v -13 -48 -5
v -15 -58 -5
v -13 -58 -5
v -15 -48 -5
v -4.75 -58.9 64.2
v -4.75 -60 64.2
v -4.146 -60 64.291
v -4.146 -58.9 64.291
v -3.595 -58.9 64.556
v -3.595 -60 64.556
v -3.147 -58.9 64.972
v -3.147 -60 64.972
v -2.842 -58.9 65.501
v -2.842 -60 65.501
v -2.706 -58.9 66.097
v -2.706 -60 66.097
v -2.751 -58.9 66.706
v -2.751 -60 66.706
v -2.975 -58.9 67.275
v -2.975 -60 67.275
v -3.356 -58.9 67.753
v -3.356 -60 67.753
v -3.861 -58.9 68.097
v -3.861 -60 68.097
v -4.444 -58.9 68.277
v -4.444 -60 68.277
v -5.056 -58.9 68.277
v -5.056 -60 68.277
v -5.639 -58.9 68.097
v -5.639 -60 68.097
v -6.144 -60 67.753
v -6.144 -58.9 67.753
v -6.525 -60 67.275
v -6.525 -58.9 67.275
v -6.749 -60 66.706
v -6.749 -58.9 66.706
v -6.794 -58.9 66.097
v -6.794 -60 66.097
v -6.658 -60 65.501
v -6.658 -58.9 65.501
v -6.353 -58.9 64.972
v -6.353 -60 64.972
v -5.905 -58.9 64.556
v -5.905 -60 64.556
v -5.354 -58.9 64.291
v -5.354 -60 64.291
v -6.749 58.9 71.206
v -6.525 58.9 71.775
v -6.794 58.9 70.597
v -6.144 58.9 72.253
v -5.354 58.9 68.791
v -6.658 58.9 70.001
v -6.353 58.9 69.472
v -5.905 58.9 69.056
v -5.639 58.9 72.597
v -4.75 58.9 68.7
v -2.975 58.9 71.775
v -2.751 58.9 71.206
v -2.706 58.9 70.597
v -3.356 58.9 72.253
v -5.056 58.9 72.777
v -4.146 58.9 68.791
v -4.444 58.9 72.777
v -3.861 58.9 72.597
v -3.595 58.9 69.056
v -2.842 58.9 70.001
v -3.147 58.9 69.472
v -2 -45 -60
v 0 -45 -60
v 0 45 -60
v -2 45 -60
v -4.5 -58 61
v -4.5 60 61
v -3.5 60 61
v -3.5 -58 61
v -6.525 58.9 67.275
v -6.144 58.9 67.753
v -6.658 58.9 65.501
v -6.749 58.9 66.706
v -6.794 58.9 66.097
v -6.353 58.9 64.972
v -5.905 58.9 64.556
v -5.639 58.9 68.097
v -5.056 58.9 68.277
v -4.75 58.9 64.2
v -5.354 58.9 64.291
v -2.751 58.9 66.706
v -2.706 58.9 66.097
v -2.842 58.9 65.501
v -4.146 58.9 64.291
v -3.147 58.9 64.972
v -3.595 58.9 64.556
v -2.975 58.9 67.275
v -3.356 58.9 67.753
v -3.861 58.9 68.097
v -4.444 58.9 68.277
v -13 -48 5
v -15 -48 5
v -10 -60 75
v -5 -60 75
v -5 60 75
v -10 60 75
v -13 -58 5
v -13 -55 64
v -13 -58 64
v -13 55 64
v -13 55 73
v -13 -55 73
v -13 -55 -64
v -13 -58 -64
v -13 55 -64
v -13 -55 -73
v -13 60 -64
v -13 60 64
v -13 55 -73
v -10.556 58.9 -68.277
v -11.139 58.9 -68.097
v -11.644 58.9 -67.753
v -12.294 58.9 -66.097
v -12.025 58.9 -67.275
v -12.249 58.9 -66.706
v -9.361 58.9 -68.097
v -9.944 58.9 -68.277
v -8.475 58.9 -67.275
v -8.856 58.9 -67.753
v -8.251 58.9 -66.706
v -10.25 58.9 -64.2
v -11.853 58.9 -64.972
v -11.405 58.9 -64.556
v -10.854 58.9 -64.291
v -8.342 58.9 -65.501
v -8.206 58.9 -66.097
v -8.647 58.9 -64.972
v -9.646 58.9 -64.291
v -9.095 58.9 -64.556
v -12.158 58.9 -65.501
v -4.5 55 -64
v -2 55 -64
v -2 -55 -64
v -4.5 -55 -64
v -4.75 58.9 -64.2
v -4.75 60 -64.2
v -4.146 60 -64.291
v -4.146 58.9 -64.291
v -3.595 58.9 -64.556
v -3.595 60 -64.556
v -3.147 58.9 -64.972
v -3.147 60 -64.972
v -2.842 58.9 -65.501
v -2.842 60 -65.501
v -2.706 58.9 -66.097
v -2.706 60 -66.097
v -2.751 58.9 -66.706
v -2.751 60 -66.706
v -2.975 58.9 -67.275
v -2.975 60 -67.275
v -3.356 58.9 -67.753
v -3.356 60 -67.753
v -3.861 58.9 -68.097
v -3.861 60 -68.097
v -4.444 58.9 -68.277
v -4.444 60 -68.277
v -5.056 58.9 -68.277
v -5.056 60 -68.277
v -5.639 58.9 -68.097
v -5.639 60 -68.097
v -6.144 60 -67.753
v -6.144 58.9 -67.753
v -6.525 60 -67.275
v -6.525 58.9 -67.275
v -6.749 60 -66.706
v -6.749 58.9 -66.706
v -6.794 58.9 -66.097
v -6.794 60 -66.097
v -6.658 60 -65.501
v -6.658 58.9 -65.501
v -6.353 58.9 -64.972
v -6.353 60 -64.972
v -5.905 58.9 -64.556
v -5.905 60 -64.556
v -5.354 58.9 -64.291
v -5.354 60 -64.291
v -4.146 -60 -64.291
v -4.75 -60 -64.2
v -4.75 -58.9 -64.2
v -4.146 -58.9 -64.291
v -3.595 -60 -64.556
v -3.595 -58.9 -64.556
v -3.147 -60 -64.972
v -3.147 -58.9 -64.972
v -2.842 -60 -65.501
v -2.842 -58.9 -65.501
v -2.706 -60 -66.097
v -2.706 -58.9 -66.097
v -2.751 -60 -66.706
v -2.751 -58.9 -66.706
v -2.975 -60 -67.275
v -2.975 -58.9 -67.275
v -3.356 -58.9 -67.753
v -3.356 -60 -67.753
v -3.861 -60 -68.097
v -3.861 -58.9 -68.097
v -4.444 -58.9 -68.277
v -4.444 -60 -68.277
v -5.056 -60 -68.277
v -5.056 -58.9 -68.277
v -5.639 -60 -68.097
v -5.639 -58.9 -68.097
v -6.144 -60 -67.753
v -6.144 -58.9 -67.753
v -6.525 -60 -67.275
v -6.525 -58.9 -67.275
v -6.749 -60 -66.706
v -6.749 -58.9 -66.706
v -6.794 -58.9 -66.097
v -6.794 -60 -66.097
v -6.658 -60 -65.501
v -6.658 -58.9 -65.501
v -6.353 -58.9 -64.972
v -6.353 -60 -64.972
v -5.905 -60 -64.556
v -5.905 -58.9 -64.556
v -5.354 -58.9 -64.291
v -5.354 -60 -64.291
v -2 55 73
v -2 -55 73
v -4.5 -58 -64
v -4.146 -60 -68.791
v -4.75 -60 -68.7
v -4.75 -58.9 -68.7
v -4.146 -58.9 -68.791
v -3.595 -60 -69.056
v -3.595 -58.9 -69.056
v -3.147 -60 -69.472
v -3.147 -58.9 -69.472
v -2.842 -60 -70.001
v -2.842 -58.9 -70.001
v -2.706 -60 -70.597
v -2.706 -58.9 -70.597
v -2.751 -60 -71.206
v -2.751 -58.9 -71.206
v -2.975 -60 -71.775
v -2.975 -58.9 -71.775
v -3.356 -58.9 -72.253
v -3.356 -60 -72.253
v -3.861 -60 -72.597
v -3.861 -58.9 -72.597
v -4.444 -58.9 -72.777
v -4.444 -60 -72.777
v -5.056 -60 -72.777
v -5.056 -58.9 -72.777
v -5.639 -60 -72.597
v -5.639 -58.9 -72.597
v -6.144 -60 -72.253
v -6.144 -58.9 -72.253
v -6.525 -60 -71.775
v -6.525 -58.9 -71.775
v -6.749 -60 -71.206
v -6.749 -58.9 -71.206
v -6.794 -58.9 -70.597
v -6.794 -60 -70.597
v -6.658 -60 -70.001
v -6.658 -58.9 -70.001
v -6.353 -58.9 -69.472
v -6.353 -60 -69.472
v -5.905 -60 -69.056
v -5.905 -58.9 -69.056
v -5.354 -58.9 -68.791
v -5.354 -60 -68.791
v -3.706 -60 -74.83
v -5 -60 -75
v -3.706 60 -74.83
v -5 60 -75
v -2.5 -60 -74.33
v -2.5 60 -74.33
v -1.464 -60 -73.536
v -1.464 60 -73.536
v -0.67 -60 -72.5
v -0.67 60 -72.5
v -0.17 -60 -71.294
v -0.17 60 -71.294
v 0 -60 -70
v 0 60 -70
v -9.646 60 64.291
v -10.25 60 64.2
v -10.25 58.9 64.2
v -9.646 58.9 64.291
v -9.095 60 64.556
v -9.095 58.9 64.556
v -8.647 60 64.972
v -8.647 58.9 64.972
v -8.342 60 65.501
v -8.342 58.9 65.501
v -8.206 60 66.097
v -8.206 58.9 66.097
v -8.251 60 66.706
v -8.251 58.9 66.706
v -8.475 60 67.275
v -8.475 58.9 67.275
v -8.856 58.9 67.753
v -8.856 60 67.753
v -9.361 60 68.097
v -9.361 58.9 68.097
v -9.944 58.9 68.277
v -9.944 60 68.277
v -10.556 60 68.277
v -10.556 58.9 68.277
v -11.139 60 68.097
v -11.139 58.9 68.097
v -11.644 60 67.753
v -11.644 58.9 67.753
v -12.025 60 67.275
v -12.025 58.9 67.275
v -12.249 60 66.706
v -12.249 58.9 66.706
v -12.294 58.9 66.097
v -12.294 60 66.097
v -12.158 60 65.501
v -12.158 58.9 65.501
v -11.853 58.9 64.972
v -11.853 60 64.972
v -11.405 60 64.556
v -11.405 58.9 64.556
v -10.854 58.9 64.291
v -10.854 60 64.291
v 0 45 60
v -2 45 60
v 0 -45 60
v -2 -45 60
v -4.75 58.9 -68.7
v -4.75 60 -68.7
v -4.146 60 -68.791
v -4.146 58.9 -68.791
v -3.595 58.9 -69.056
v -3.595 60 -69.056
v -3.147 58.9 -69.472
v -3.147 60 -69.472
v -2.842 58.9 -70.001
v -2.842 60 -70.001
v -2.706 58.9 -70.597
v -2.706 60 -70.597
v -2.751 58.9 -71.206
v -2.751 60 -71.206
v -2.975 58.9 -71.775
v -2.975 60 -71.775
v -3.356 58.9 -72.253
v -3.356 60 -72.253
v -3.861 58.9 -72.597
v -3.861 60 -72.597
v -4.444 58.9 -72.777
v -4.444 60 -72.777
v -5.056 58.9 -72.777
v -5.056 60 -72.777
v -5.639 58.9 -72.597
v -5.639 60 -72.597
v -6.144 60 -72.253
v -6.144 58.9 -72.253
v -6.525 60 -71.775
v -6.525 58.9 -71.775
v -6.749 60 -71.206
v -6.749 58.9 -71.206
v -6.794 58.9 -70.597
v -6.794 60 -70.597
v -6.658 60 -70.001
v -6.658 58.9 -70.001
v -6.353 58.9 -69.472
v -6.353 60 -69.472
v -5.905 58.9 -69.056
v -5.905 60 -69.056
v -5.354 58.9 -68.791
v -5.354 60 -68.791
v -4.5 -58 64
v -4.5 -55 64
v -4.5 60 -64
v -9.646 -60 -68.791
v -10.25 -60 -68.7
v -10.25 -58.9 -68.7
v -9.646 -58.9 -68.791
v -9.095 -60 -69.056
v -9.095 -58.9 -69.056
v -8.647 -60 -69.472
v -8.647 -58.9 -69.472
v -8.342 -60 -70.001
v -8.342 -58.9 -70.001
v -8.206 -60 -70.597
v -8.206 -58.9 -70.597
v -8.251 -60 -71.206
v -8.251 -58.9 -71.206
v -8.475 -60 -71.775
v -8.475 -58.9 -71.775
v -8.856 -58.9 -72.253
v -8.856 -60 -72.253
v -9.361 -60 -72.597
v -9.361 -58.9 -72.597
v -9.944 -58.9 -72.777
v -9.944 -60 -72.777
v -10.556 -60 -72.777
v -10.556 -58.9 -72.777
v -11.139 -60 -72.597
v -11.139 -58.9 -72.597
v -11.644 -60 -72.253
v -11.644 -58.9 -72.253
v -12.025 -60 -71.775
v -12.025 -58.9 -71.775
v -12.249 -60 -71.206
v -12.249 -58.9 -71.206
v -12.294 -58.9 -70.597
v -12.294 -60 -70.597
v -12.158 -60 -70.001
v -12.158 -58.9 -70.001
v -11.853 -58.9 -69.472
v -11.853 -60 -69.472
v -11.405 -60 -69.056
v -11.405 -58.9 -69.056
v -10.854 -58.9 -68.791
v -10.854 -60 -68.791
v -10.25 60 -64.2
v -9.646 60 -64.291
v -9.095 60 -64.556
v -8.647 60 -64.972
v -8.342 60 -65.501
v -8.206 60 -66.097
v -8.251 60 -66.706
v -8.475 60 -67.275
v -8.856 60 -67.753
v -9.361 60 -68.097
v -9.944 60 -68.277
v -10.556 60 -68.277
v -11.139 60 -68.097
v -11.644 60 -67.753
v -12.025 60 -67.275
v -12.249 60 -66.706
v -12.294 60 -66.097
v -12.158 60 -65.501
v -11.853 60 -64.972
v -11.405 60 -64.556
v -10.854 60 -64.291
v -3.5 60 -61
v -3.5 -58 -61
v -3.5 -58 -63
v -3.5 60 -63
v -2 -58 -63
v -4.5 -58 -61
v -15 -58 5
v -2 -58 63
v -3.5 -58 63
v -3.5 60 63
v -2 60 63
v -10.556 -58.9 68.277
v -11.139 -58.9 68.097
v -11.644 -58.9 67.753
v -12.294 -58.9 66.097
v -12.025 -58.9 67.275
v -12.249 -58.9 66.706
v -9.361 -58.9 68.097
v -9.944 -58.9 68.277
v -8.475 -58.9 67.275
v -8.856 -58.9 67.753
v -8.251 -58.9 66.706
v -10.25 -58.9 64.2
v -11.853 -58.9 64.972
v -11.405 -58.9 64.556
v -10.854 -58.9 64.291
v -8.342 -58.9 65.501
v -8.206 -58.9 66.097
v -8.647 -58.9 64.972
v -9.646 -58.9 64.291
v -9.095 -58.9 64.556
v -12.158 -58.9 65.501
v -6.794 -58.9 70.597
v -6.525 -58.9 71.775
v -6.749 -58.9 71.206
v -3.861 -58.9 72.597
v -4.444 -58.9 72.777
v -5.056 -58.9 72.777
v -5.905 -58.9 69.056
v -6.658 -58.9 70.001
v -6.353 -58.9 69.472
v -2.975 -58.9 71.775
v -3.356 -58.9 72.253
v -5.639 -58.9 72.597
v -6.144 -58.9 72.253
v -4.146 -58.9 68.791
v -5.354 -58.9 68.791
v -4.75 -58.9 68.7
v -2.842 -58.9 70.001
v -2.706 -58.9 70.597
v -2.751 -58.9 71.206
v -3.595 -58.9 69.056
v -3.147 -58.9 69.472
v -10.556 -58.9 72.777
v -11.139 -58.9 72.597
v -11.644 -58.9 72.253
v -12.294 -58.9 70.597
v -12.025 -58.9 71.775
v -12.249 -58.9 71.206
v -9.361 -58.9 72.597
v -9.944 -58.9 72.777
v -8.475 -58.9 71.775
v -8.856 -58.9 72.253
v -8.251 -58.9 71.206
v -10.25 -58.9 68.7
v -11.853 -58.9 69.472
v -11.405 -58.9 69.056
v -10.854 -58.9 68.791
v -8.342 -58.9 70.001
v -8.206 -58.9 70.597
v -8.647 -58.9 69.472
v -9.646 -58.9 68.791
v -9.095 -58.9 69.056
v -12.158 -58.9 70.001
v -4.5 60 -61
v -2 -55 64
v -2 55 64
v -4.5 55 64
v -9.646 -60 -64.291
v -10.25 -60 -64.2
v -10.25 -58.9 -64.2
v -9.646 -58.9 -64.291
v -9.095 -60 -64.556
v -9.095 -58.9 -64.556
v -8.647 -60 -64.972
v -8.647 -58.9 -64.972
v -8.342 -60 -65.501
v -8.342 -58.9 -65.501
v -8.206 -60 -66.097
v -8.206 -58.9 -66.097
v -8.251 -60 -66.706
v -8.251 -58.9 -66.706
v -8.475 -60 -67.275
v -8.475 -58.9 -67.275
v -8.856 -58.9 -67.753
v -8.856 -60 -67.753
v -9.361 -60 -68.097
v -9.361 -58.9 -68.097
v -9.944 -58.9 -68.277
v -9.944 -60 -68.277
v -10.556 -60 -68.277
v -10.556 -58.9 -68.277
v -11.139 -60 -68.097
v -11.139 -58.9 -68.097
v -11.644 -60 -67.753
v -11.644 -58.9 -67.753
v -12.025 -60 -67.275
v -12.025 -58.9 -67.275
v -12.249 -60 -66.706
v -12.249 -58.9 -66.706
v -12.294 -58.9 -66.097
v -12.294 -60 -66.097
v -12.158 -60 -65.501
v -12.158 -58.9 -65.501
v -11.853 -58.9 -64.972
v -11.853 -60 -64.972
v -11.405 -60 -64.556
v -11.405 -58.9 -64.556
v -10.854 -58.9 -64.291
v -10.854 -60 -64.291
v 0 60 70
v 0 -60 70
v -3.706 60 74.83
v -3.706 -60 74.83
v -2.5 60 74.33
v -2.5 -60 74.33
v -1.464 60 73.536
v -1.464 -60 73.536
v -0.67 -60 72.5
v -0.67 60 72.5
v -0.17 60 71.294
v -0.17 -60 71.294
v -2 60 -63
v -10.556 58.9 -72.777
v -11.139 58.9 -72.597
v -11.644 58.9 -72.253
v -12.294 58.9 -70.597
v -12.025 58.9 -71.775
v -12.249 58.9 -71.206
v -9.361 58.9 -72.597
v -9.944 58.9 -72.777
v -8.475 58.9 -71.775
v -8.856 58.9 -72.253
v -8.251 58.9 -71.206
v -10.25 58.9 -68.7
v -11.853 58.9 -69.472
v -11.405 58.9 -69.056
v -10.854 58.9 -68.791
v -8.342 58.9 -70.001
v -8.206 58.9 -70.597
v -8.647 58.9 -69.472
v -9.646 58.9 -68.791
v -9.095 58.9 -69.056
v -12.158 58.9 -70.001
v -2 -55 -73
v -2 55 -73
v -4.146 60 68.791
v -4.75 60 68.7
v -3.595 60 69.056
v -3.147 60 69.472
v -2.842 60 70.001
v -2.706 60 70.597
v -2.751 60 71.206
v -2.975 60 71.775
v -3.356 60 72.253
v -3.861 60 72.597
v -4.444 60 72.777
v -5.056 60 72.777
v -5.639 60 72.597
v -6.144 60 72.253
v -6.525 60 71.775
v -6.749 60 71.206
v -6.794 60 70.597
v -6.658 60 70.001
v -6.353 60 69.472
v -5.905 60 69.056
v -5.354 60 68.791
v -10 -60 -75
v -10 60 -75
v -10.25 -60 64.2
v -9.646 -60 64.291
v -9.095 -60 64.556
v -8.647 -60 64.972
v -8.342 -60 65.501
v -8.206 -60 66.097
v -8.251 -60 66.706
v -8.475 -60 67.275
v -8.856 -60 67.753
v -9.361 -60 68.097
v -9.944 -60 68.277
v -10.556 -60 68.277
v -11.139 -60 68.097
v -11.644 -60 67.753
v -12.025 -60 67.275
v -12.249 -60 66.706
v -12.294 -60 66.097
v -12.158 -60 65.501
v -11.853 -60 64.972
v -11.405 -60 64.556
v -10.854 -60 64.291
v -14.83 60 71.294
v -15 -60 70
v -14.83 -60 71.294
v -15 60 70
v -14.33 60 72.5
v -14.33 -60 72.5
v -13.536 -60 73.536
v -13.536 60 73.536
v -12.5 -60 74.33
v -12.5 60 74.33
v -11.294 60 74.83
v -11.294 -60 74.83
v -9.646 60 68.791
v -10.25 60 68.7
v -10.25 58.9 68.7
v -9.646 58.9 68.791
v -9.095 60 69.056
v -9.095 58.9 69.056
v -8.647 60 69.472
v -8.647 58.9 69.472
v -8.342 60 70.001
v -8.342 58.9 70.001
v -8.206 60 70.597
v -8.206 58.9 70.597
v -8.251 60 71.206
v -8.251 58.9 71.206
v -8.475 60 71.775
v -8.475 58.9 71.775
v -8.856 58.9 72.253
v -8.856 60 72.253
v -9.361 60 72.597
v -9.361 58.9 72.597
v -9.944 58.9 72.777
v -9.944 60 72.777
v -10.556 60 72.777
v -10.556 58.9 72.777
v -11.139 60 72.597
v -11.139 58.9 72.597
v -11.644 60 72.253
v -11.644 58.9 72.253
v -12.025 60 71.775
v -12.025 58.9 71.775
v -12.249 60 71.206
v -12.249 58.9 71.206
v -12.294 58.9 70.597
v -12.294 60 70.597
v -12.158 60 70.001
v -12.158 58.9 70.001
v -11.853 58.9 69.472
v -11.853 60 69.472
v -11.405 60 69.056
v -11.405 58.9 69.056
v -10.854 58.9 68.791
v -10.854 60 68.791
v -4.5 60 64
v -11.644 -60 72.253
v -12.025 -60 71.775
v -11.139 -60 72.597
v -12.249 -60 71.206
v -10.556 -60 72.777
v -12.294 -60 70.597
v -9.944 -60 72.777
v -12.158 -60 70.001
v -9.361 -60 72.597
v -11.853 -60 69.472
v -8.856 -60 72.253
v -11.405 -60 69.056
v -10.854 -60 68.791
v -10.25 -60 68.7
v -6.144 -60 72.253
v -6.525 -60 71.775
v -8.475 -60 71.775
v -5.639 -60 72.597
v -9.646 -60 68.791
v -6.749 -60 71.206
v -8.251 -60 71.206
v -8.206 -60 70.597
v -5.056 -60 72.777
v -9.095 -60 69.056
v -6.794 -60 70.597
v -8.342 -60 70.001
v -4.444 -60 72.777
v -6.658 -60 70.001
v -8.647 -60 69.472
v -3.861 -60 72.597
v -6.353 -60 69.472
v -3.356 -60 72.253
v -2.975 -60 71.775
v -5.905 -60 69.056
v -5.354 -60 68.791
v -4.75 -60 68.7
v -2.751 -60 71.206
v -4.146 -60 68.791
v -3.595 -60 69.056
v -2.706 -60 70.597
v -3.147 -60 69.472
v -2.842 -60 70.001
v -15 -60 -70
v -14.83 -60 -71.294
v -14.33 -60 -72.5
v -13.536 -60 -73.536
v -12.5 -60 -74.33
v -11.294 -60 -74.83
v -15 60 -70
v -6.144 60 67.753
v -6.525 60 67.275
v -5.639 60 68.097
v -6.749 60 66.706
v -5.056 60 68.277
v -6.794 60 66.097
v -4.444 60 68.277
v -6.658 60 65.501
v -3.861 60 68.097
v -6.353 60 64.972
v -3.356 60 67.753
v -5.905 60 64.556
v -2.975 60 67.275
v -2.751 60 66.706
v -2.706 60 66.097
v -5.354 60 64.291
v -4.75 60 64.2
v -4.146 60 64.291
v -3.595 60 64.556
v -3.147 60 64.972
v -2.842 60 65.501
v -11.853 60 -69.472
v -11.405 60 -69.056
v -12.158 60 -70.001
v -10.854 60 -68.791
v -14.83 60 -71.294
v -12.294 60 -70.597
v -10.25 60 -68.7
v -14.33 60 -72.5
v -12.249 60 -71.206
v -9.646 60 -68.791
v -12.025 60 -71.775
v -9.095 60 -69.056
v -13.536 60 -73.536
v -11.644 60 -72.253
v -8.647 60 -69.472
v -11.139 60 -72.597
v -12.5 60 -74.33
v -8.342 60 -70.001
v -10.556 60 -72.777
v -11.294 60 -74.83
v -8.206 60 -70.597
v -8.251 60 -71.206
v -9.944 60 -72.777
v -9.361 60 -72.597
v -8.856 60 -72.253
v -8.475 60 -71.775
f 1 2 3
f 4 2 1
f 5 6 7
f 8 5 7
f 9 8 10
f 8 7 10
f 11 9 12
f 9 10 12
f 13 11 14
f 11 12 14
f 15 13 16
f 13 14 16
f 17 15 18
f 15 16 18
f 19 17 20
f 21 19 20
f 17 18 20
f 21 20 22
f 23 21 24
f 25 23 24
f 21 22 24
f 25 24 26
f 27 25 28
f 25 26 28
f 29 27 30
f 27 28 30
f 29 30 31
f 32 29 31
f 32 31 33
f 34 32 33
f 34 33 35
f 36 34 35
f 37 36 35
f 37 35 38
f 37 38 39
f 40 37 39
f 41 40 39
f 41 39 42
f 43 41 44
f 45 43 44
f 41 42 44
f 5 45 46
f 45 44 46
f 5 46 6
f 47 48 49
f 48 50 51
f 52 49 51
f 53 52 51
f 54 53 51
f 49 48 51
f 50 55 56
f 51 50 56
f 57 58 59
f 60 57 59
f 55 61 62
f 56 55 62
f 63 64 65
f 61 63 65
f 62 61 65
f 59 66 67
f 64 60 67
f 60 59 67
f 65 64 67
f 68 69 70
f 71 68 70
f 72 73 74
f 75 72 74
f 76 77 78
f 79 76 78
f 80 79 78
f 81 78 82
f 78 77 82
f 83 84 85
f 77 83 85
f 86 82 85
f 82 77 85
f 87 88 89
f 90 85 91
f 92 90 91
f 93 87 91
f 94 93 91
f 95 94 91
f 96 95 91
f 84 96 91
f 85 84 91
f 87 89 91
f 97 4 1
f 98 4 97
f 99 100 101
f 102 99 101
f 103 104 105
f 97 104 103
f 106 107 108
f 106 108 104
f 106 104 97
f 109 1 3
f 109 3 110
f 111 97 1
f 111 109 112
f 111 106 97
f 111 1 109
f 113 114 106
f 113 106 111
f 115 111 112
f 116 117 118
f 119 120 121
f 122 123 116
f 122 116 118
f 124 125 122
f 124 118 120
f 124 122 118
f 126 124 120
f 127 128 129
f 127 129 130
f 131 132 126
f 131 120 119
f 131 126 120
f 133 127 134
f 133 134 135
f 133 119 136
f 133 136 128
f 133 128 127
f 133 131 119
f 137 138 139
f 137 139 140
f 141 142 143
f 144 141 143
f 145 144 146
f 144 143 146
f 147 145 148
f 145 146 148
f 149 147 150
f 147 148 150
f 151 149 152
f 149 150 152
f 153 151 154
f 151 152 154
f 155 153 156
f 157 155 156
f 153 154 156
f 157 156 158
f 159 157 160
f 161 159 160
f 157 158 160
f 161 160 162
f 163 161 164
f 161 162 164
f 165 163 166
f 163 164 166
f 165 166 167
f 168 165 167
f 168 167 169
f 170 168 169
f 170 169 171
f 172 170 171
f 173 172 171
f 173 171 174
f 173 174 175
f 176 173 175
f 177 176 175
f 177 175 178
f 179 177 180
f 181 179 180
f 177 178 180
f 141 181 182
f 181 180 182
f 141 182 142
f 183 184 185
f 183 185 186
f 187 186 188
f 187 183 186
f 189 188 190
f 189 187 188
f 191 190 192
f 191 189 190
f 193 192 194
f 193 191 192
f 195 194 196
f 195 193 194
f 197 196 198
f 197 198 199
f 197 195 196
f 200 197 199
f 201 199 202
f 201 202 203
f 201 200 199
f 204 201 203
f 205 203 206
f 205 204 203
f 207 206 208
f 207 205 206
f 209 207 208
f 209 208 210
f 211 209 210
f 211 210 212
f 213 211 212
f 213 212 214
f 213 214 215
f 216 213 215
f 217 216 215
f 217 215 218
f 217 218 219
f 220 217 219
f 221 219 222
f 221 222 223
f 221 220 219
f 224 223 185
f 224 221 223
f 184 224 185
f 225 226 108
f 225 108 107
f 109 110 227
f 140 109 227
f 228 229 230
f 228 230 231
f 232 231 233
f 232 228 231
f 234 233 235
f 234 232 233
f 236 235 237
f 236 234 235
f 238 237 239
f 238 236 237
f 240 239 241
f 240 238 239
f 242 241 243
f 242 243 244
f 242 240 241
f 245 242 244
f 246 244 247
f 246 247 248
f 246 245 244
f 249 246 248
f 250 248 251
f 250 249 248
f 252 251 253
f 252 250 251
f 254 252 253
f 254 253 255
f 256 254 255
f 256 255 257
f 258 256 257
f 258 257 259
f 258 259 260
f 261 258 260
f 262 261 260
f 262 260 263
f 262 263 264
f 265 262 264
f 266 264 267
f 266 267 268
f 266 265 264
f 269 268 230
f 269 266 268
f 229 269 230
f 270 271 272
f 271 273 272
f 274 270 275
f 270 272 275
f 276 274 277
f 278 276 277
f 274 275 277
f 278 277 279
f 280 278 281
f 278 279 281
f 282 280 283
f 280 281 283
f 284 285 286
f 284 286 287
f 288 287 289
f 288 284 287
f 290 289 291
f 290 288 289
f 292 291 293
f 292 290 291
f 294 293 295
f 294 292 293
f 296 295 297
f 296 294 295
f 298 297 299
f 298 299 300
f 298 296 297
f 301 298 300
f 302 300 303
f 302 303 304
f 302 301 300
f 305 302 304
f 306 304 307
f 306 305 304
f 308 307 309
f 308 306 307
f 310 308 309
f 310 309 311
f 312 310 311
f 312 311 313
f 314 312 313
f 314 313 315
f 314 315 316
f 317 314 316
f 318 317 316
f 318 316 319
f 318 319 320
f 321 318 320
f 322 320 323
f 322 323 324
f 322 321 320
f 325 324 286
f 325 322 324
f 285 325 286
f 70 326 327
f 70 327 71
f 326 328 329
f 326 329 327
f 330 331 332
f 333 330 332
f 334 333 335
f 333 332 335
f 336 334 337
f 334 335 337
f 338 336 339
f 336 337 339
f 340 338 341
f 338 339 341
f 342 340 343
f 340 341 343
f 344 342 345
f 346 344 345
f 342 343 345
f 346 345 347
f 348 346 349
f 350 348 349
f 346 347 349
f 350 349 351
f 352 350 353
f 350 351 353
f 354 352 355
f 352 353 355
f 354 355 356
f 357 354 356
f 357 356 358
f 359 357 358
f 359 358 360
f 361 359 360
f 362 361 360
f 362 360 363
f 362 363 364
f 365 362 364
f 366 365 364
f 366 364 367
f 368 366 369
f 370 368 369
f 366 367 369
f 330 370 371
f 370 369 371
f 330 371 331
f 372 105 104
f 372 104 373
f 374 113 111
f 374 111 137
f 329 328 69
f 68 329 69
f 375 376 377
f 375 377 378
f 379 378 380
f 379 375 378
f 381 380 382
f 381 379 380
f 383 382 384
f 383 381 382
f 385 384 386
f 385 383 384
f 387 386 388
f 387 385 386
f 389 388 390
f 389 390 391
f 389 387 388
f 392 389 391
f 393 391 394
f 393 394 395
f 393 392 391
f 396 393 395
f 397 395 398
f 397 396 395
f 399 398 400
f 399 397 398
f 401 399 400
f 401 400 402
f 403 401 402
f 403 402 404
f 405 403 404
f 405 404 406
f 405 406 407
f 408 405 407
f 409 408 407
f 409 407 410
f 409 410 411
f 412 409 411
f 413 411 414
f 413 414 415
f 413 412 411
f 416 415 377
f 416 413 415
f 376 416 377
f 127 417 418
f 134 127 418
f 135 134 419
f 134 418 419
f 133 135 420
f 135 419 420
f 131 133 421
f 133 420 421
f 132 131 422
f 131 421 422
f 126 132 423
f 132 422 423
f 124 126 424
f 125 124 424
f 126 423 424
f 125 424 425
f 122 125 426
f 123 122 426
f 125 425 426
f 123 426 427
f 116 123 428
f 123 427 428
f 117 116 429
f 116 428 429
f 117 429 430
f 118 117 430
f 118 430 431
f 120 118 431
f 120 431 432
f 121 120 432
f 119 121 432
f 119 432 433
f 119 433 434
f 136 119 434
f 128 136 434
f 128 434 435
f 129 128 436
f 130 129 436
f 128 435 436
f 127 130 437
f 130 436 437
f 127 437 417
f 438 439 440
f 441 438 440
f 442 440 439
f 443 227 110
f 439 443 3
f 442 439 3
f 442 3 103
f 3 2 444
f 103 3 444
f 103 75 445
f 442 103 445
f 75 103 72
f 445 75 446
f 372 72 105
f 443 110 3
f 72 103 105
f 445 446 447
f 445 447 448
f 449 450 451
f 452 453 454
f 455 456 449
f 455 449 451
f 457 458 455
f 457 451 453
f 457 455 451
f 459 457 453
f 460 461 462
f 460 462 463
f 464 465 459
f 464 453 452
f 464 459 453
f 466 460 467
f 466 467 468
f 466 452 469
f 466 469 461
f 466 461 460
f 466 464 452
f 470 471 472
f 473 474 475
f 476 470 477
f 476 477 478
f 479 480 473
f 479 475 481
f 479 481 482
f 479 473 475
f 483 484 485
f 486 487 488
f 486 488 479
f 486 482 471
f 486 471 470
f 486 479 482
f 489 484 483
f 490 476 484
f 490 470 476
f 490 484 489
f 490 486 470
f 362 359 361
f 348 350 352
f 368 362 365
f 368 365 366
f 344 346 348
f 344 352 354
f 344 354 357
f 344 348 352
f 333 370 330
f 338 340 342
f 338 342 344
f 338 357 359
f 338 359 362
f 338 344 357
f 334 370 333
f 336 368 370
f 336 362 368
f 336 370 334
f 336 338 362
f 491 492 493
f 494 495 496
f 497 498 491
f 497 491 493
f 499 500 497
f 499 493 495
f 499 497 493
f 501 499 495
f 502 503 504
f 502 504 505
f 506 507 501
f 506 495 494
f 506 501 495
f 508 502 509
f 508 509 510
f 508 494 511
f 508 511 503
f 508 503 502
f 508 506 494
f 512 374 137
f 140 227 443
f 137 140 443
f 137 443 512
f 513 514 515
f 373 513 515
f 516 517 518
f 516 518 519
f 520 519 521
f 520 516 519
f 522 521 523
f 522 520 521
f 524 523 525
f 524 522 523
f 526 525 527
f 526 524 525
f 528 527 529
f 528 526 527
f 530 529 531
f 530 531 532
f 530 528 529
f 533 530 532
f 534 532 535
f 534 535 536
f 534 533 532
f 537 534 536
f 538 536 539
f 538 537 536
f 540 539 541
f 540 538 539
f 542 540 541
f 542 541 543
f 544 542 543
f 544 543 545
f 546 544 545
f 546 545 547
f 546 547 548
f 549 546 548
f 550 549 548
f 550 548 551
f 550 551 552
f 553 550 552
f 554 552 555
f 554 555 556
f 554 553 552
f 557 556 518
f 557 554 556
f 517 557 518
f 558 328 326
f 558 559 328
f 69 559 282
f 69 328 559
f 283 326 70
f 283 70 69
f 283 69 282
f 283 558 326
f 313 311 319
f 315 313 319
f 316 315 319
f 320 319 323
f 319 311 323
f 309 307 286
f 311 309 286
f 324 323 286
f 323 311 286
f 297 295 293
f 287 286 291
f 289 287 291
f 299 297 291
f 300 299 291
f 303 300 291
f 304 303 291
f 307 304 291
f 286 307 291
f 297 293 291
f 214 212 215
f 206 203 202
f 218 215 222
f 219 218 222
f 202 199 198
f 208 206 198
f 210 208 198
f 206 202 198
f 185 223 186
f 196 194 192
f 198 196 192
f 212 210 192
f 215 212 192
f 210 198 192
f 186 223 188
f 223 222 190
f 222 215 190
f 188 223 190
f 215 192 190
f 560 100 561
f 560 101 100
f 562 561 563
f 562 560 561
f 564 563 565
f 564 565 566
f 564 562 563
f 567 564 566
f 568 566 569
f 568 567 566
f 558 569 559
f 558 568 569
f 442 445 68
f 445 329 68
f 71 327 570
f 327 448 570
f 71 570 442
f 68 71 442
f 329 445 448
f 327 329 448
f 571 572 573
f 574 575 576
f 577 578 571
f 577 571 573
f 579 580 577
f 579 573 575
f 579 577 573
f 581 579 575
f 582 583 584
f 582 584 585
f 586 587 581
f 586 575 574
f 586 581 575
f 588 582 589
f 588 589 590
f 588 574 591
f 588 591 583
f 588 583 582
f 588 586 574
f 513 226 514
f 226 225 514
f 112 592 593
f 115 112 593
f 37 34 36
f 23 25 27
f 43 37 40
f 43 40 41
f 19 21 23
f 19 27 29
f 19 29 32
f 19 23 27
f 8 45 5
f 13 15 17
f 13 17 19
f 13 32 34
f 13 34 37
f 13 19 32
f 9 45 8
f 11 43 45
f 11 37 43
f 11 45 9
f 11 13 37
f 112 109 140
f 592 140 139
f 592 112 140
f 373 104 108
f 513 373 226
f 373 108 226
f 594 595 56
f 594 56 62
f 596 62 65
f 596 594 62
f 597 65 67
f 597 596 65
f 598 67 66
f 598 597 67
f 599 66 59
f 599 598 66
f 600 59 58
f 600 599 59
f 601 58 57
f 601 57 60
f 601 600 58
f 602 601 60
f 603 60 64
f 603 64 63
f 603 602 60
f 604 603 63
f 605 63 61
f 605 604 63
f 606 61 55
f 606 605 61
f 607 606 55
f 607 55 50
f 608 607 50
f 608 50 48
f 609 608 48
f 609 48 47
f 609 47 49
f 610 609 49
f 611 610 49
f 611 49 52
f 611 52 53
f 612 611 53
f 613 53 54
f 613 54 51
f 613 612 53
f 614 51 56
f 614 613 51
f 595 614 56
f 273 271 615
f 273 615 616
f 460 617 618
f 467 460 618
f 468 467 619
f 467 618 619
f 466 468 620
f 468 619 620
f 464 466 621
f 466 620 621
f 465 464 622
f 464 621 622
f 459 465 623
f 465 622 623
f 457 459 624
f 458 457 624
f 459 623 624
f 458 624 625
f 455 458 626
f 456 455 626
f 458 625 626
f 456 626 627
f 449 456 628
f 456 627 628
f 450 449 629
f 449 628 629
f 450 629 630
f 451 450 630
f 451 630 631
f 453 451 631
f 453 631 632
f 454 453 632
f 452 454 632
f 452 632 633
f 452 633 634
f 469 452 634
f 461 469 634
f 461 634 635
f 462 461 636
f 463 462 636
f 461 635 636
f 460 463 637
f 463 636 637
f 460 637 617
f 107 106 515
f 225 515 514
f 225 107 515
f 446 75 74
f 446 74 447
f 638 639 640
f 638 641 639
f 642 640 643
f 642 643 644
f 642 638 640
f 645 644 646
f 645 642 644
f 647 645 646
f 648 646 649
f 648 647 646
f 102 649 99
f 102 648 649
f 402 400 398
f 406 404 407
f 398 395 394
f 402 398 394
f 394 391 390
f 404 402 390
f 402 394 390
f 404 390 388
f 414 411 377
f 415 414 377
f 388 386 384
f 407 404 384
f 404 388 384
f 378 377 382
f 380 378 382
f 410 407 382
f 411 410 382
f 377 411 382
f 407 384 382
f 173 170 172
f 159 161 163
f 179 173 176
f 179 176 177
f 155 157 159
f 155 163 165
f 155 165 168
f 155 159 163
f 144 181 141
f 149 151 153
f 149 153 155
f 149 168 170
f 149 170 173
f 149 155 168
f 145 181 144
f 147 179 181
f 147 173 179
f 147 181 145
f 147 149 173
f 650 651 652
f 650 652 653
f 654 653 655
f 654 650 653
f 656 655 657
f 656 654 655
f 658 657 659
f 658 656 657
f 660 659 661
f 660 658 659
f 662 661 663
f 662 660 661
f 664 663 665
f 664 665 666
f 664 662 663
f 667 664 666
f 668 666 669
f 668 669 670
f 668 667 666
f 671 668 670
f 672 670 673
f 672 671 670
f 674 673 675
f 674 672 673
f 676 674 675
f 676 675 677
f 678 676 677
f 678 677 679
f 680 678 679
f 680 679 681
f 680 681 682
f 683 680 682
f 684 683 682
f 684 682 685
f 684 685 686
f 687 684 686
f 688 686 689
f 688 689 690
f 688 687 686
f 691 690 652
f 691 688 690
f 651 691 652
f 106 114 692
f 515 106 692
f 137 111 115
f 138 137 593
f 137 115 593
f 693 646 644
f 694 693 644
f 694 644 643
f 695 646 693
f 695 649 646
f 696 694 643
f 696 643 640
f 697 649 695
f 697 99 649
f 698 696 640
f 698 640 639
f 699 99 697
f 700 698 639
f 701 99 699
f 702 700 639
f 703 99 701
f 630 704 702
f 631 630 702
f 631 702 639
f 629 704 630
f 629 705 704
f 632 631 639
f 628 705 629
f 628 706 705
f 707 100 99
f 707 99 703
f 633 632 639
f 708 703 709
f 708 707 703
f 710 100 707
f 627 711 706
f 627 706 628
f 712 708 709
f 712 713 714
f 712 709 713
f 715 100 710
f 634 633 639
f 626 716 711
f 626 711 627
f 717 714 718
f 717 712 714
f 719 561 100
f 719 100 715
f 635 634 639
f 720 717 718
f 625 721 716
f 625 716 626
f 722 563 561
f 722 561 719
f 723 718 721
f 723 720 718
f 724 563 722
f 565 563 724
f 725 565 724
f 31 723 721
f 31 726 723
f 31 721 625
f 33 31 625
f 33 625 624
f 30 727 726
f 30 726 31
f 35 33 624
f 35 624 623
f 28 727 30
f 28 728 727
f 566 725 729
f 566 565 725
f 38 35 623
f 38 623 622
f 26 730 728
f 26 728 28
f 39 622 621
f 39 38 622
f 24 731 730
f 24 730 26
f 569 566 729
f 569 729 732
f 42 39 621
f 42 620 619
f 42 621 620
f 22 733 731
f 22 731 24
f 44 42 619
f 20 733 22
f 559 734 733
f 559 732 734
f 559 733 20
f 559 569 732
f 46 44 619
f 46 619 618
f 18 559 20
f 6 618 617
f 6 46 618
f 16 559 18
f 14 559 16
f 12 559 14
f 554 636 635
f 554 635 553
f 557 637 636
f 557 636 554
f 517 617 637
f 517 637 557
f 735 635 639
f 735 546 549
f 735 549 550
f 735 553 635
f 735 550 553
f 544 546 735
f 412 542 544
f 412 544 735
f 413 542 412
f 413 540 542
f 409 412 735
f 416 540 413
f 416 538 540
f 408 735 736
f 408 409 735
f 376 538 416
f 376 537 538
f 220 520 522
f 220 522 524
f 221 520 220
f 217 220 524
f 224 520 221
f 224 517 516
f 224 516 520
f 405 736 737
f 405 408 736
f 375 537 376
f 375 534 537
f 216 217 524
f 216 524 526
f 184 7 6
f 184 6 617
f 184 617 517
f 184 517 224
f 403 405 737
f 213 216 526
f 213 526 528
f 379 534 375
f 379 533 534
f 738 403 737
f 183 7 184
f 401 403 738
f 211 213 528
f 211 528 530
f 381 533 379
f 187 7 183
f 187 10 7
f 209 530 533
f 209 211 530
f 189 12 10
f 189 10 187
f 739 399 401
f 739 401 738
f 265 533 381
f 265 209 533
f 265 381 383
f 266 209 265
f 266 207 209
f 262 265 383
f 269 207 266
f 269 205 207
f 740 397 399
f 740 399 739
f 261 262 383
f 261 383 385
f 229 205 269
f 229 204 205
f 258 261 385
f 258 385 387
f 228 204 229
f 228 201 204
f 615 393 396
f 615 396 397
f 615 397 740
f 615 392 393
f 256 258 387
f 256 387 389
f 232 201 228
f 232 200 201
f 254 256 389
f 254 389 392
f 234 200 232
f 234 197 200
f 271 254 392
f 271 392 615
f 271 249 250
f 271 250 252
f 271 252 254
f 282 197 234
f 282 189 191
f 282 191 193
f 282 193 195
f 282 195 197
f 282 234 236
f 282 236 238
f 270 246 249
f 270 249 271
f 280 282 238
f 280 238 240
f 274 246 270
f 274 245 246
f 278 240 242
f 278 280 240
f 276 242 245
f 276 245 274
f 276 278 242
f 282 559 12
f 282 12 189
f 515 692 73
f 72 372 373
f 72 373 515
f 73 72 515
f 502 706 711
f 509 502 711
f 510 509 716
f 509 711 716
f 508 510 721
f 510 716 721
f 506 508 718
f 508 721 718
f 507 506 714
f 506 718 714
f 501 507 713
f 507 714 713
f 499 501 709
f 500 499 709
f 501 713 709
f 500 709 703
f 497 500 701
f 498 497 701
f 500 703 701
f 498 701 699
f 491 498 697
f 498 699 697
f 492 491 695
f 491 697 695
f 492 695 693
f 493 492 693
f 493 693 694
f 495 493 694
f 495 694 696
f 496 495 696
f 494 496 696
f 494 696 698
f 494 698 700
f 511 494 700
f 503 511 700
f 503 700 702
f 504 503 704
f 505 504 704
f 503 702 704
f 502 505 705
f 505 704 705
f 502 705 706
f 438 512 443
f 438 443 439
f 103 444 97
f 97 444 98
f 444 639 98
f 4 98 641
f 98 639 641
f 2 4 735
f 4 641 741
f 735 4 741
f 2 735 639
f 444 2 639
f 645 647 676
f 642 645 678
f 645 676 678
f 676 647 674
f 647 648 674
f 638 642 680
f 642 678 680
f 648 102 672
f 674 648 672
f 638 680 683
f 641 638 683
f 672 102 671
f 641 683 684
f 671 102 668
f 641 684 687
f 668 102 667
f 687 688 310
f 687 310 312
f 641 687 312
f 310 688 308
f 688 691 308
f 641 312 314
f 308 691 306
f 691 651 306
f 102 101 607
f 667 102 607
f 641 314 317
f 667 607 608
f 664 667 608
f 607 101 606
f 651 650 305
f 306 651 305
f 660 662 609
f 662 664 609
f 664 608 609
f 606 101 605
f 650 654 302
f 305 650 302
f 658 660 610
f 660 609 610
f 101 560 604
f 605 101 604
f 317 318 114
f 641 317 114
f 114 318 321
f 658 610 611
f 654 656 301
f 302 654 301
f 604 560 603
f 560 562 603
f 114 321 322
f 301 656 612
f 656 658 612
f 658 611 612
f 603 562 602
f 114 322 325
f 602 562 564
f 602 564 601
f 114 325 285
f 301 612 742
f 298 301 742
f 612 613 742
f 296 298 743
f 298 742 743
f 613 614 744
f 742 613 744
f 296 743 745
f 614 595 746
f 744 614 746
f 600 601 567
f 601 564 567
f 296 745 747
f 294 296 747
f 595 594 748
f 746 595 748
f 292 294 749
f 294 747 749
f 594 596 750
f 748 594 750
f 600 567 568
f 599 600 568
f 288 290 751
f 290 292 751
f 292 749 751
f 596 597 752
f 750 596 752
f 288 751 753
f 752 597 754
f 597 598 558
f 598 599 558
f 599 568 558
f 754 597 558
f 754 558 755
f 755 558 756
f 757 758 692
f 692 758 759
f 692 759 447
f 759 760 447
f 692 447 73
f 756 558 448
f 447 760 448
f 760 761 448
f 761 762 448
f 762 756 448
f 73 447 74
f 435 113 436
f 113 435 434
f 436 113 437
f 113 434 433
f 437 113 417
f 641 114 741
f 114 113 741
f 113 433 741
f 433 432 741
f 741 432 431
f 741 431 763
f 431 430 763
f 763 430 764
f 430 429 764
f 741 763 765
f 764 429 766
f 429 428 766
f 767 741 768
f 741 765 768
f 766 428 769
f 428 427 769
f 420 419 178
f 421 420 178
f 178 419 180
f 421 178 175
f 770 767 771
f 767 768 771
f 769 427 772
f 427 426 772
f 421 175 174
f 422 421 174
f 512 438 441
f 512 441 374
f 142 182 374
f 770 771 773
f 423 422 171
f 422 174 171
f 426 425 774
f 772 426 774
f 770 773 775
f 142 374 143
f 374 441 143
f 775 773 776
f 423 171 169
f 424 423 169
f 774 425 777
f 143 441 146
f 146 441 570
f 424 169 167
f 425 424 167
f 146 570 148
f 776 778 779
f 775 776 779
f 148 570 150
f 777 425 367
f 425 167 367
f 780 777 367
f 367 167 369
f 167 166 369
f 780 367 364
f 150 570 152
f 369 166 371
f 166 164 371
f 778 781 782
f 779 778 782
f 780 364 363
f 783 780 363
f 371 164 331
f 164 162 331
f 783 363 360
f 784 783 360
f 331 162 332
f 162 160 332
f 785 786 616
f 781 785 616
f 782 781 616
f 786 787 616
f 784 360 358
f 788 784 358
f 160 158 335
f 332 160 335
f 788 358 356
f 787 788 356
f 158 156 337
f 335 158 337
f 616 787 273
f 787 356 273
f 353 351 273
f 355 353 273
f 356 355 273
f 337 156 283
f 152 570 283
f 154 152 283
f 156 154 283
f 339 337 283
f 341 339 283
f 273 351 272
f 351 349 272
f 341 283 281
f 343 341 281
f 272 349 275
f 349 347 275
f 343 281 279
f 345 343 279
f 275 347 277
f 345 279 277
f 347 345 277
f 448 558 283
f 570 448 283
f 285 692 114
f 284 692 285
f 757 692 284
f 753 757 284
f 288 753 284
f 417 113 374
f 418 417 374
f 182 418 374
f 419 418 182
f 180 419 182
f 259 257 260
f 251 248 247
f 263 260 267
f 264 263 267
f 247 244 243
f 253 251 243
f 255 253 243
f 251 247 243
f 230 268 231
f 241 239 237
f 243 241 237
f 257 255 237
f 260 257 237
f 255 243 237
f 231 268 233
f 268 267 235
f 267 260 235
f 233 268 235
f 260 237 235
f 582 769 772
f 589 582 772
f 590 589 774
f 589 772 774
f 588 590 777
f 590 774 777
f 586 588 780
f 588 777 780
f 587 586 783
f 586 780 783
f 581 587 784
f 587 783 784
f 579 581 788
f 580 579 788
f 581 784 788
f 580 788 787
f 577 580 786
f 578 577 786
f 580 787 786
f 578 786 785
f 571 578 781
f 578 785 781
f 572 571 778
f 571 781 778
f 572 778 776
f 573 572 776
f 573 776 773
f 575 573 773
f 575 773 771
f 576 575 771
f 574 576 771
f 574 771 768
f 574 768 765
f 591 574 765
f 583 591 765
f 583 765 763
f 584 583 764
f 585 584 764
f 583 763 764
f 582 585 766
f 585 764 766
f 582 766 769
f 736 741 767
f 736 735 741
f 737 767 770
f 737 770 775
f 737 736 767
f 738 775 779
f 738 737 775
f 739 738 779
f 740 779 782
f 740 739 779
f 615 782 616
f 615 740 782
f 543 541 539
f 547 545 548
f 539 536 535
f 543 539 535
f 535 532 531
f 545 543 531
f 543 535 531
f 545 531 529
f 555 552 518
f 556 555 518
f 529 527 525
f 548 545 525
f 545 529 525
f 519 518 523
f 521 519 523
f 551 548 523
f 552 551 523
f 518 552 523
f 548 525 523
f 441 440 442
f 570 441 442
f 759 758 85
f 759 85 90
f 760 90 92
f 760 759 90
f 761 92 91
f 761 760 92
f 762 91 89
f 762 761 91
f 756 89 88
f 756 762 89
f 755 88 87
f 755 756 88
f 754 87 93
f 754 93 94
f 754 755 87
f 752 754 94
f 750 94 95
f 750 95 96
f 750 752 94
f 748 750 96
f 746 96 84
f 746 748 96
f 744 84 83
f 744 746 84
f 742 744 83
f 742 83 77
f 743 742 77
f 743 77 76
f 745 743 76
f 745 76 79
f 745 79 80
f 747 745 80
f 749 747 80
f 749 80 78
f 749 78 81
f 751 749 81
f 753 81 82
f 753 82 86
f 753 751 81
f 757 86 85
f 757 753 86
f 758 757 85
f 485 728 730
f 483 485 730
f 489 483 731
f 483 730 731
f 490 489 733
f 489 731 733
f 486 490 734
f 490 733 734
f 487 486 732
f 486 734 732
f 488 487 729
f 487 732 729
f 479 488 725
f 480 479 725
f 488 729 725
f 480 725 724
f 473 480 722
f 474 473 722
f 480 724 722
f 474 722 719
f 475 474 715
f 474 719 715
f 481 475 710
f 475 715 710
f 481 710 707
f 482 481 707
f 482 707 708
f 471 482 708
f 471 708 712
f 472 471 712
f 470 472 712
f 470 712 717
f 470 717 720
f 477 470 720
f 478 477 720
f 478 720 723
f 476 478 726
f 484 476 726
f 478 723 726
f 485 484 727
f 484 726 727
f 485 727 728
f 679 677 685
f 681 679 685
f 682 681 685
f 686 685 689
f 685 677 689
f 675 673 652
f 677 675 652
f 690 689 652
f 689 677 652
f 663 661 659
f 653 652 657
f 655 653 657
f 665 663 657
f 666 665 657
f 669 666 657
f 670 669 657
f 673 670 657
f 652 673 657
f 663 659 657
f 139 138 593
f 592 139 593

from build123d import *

# Parameters (mm, degrees)
SKETCH1_W               = 150
SKETCH1_H               = 120
BOSS_EXTRUDE1_DEPTH     = 15
SHELL1_T                = -2
CUT_EXTRUDE1_REACH      = 99.211
SKETCH2_W               = 120
SKETCH2_H               = 90
BOSS_EXTRUDE2_START     = -58
BOSS_EXTRUDE2_DEPTH     = 118
SKETCH4_W               = 13
SKETCH4_H               = 11
BOSS_EXTRUDE3_DEPTH     = 5
SKETCH5_R               = 2.05
CUT_EXTRUDE2_DEPTH      = 1.1
SKETCH6_W               = 10
SKETCH6_H               = 10
CUT_EXTRUDE3_DEPTH      = 2
MIRROR3_COPY_1_SKETCH_W = 13
MIRROR3_COPY_1_SKETCH_H = 11
MIRROR3_COPY_1_DEPTH    = 5
MIRROR3_COPY_2_SKETCH_R = 2.05
MIRROR3_COPY_2_DEPTH    = 1.1
FILLET1_R               = 5


with BuildPart() as part:
    # Sketch1 → Boss-Extrude1 (new body)
    with BuildSketch(Plane(origin=(0, 0, 0), x_dir=(0, 0, -1), z_dir=(1, 0, 0))):
        Rectangle(SKETCH1_W, SKETCH1_H)
    extrude(amount=-BOSS_EXTRUDE1_DEPTH)

    # Shell1
    shell1_openings = [part.faces().sort_by_distance(p)[0] for p in [
        (-7.5, 60, 0),
    ]]
    offset(amount=SHELL1_T, openings=shell1_openings, kind=Kind.INTERSECTION)

    # Sketch2 → Cut-Extrude1 (cut, up to next)
    with BuildSketch(Plane(origin=(0, 0, 0), x_dir=(0, 0, -1), z_dir=(1, 0, 0)), mode=Mode.PRIVATE) as cut_extrude1_sk1:
        Rectangle(SKETCH2_W, SKETCH2_H)
    cut_extrude1_tool1 = extrude(cut_extrude1_sk1.sketch, amount=-CUT_EXTRUDE1_REACH, mode=Mode.PRIVATE) & part.part
    add(cut_extrude1_tool1.solids().sort_by_distance((0, 0, 0))[0], mode=Mode.SUBTRACT)

    # Sketch3 → Boss-Extrude2 (add)
    with BuildSketch(Plane(origin=(0, 0, 0), x_dir=(1, 0, 0), z_dir=(0, 1, 0)).offset(BOSS_EXTRUDE2_START)):
        Polygon((-3.5, 63), (-2, 63), (-2, 64), (-4.5, 64), (-4.5, 61), (-3.5, 61), align=None)
    boss_extrude2 = extrude(amount=BOSS_EXTRUDE2_DEPTH)

    # Mirror1: Boss-Extrude2 across plane
    add(boss_extrude2.mirror(Plane.XY))

    # Sketch4 → Boss-Extrude3 (add)
    with BuildSketch(Plane(origin=(0, 60, 0), x_dir=(1, 0, 0), z_dir=(0, 1, 0))):
        with Locations((-8.5, 69.5)):
            Rectangle(SKETCH4_W, SKETCH4_H)
    boss_extrude3 = extrude(amount=-BOSS_EXTRUDE3_DEPTH)

    # Sketch5 → Cut-Extrude2 (cut)
    with BuildSketch(Plane(origin=(0, 60, 0), x_dir=(1, 0, 0), z_dir=(0, 1, 0))):
        with Locations(Location((-10.25, 70.75, 0), (0, 0, 270))):
            Circle(SKETCH5_R)
        with Locations(Location((-10.25, 66.25, 0), (0, 0, 270))):
            Circle(SKETCH5_R)
        with Locations(Location((-4.75, 70.75, 0), (0, 0, 270))):
            Circle(SKETCH5_R)
        with Locations(Location((-4.75, 66.25, 0), (0, 0, 270))):
            Circle(SKETCH5_R)
    cut_extrude2 = extrude(amount=-CUT_EXTRUDE2_DEPTH, mode=Mode.SUBTRACT)

    # Mirror2: Boss-Extrude3, Cut-Extrude2 across plane
    add(boss_extrude3.mirror(Plane.XY))
    add(cut_extrude2.mirror(Plane.XY), mode=Mode.SUBTRACT)

    # Sketch6 → Cut-Extrude3 (cut)
    with BuildSketch(Plane.ZY.offset(15)):
        with Locations((0, -53)):
            Rectangle(SKETCH6_W, SKETCH6_H)
    extrude(amount=-CUT_EXTRUDE3_DEPTH, mode=Mode.SUBTRACT)

    # Mirror3: Boss-Extrude3, Cut-Extrude2 across plane
    add(boss_extrude3.mirror(Plane.ZX))
    add(cut_extrude2.mirror(Plane.ZX), mode=Mode.SUBTRACT)

    # Mirror3 copy 1 sketch → Mirror3 copy 1 (add)
    with BuildSketch(Plane.XZ.offset(60)):
        with Locations((-8.5, 69.5)):
            Rectangle(MIRROR3_COPY_1_SKETCH_W, MIRROR3_COPY_1_SKETCH_H)
    extrude(amount=-MIRROR3_COPY_1_DEPTH)

    # Mirror3 copy 2 sketch → Mirror3 copy 2 (cut)
    with BuildSketch(Plane.XZ.offset(60)):
        with Locations(Location((-10.25, 70.75, 0), (0, 0, 270))):
            Circle(MIRROR3_COPY_2_SKETCH_R)
        with Locations(Location((-10.25, 66.25, 0), (0, 0, 270))):
            Circle(MIRROR3_COPY_2_SKETCH_R)
        with Locations(Location((-4.75, 70.75, 0), (0, 0, 270))):
            Circle(MIRROR3_COPY_2_SKETCH_R)
        with Locations(Location((-4.75, 66.25, 0), (0, 0, 270))):
            Circle(MIRROR3_COPY_2_SKETCH_R)
    extrude(amount=-MIRROR3_COPY_2_DEPTH, mode=Mode.SUBTRACT)

    # Fillet1
    fillet1_edges = [part.edges().sort_by_distance(p)[0] for p in [
        (-15, 0, 75),
        (-15, 0, -75),
        (0, 0, 75),
        (0, 0, -75),
    ]]
    fillet(fillet1_edges, radius=FILLET1_R)


solid = part.part
